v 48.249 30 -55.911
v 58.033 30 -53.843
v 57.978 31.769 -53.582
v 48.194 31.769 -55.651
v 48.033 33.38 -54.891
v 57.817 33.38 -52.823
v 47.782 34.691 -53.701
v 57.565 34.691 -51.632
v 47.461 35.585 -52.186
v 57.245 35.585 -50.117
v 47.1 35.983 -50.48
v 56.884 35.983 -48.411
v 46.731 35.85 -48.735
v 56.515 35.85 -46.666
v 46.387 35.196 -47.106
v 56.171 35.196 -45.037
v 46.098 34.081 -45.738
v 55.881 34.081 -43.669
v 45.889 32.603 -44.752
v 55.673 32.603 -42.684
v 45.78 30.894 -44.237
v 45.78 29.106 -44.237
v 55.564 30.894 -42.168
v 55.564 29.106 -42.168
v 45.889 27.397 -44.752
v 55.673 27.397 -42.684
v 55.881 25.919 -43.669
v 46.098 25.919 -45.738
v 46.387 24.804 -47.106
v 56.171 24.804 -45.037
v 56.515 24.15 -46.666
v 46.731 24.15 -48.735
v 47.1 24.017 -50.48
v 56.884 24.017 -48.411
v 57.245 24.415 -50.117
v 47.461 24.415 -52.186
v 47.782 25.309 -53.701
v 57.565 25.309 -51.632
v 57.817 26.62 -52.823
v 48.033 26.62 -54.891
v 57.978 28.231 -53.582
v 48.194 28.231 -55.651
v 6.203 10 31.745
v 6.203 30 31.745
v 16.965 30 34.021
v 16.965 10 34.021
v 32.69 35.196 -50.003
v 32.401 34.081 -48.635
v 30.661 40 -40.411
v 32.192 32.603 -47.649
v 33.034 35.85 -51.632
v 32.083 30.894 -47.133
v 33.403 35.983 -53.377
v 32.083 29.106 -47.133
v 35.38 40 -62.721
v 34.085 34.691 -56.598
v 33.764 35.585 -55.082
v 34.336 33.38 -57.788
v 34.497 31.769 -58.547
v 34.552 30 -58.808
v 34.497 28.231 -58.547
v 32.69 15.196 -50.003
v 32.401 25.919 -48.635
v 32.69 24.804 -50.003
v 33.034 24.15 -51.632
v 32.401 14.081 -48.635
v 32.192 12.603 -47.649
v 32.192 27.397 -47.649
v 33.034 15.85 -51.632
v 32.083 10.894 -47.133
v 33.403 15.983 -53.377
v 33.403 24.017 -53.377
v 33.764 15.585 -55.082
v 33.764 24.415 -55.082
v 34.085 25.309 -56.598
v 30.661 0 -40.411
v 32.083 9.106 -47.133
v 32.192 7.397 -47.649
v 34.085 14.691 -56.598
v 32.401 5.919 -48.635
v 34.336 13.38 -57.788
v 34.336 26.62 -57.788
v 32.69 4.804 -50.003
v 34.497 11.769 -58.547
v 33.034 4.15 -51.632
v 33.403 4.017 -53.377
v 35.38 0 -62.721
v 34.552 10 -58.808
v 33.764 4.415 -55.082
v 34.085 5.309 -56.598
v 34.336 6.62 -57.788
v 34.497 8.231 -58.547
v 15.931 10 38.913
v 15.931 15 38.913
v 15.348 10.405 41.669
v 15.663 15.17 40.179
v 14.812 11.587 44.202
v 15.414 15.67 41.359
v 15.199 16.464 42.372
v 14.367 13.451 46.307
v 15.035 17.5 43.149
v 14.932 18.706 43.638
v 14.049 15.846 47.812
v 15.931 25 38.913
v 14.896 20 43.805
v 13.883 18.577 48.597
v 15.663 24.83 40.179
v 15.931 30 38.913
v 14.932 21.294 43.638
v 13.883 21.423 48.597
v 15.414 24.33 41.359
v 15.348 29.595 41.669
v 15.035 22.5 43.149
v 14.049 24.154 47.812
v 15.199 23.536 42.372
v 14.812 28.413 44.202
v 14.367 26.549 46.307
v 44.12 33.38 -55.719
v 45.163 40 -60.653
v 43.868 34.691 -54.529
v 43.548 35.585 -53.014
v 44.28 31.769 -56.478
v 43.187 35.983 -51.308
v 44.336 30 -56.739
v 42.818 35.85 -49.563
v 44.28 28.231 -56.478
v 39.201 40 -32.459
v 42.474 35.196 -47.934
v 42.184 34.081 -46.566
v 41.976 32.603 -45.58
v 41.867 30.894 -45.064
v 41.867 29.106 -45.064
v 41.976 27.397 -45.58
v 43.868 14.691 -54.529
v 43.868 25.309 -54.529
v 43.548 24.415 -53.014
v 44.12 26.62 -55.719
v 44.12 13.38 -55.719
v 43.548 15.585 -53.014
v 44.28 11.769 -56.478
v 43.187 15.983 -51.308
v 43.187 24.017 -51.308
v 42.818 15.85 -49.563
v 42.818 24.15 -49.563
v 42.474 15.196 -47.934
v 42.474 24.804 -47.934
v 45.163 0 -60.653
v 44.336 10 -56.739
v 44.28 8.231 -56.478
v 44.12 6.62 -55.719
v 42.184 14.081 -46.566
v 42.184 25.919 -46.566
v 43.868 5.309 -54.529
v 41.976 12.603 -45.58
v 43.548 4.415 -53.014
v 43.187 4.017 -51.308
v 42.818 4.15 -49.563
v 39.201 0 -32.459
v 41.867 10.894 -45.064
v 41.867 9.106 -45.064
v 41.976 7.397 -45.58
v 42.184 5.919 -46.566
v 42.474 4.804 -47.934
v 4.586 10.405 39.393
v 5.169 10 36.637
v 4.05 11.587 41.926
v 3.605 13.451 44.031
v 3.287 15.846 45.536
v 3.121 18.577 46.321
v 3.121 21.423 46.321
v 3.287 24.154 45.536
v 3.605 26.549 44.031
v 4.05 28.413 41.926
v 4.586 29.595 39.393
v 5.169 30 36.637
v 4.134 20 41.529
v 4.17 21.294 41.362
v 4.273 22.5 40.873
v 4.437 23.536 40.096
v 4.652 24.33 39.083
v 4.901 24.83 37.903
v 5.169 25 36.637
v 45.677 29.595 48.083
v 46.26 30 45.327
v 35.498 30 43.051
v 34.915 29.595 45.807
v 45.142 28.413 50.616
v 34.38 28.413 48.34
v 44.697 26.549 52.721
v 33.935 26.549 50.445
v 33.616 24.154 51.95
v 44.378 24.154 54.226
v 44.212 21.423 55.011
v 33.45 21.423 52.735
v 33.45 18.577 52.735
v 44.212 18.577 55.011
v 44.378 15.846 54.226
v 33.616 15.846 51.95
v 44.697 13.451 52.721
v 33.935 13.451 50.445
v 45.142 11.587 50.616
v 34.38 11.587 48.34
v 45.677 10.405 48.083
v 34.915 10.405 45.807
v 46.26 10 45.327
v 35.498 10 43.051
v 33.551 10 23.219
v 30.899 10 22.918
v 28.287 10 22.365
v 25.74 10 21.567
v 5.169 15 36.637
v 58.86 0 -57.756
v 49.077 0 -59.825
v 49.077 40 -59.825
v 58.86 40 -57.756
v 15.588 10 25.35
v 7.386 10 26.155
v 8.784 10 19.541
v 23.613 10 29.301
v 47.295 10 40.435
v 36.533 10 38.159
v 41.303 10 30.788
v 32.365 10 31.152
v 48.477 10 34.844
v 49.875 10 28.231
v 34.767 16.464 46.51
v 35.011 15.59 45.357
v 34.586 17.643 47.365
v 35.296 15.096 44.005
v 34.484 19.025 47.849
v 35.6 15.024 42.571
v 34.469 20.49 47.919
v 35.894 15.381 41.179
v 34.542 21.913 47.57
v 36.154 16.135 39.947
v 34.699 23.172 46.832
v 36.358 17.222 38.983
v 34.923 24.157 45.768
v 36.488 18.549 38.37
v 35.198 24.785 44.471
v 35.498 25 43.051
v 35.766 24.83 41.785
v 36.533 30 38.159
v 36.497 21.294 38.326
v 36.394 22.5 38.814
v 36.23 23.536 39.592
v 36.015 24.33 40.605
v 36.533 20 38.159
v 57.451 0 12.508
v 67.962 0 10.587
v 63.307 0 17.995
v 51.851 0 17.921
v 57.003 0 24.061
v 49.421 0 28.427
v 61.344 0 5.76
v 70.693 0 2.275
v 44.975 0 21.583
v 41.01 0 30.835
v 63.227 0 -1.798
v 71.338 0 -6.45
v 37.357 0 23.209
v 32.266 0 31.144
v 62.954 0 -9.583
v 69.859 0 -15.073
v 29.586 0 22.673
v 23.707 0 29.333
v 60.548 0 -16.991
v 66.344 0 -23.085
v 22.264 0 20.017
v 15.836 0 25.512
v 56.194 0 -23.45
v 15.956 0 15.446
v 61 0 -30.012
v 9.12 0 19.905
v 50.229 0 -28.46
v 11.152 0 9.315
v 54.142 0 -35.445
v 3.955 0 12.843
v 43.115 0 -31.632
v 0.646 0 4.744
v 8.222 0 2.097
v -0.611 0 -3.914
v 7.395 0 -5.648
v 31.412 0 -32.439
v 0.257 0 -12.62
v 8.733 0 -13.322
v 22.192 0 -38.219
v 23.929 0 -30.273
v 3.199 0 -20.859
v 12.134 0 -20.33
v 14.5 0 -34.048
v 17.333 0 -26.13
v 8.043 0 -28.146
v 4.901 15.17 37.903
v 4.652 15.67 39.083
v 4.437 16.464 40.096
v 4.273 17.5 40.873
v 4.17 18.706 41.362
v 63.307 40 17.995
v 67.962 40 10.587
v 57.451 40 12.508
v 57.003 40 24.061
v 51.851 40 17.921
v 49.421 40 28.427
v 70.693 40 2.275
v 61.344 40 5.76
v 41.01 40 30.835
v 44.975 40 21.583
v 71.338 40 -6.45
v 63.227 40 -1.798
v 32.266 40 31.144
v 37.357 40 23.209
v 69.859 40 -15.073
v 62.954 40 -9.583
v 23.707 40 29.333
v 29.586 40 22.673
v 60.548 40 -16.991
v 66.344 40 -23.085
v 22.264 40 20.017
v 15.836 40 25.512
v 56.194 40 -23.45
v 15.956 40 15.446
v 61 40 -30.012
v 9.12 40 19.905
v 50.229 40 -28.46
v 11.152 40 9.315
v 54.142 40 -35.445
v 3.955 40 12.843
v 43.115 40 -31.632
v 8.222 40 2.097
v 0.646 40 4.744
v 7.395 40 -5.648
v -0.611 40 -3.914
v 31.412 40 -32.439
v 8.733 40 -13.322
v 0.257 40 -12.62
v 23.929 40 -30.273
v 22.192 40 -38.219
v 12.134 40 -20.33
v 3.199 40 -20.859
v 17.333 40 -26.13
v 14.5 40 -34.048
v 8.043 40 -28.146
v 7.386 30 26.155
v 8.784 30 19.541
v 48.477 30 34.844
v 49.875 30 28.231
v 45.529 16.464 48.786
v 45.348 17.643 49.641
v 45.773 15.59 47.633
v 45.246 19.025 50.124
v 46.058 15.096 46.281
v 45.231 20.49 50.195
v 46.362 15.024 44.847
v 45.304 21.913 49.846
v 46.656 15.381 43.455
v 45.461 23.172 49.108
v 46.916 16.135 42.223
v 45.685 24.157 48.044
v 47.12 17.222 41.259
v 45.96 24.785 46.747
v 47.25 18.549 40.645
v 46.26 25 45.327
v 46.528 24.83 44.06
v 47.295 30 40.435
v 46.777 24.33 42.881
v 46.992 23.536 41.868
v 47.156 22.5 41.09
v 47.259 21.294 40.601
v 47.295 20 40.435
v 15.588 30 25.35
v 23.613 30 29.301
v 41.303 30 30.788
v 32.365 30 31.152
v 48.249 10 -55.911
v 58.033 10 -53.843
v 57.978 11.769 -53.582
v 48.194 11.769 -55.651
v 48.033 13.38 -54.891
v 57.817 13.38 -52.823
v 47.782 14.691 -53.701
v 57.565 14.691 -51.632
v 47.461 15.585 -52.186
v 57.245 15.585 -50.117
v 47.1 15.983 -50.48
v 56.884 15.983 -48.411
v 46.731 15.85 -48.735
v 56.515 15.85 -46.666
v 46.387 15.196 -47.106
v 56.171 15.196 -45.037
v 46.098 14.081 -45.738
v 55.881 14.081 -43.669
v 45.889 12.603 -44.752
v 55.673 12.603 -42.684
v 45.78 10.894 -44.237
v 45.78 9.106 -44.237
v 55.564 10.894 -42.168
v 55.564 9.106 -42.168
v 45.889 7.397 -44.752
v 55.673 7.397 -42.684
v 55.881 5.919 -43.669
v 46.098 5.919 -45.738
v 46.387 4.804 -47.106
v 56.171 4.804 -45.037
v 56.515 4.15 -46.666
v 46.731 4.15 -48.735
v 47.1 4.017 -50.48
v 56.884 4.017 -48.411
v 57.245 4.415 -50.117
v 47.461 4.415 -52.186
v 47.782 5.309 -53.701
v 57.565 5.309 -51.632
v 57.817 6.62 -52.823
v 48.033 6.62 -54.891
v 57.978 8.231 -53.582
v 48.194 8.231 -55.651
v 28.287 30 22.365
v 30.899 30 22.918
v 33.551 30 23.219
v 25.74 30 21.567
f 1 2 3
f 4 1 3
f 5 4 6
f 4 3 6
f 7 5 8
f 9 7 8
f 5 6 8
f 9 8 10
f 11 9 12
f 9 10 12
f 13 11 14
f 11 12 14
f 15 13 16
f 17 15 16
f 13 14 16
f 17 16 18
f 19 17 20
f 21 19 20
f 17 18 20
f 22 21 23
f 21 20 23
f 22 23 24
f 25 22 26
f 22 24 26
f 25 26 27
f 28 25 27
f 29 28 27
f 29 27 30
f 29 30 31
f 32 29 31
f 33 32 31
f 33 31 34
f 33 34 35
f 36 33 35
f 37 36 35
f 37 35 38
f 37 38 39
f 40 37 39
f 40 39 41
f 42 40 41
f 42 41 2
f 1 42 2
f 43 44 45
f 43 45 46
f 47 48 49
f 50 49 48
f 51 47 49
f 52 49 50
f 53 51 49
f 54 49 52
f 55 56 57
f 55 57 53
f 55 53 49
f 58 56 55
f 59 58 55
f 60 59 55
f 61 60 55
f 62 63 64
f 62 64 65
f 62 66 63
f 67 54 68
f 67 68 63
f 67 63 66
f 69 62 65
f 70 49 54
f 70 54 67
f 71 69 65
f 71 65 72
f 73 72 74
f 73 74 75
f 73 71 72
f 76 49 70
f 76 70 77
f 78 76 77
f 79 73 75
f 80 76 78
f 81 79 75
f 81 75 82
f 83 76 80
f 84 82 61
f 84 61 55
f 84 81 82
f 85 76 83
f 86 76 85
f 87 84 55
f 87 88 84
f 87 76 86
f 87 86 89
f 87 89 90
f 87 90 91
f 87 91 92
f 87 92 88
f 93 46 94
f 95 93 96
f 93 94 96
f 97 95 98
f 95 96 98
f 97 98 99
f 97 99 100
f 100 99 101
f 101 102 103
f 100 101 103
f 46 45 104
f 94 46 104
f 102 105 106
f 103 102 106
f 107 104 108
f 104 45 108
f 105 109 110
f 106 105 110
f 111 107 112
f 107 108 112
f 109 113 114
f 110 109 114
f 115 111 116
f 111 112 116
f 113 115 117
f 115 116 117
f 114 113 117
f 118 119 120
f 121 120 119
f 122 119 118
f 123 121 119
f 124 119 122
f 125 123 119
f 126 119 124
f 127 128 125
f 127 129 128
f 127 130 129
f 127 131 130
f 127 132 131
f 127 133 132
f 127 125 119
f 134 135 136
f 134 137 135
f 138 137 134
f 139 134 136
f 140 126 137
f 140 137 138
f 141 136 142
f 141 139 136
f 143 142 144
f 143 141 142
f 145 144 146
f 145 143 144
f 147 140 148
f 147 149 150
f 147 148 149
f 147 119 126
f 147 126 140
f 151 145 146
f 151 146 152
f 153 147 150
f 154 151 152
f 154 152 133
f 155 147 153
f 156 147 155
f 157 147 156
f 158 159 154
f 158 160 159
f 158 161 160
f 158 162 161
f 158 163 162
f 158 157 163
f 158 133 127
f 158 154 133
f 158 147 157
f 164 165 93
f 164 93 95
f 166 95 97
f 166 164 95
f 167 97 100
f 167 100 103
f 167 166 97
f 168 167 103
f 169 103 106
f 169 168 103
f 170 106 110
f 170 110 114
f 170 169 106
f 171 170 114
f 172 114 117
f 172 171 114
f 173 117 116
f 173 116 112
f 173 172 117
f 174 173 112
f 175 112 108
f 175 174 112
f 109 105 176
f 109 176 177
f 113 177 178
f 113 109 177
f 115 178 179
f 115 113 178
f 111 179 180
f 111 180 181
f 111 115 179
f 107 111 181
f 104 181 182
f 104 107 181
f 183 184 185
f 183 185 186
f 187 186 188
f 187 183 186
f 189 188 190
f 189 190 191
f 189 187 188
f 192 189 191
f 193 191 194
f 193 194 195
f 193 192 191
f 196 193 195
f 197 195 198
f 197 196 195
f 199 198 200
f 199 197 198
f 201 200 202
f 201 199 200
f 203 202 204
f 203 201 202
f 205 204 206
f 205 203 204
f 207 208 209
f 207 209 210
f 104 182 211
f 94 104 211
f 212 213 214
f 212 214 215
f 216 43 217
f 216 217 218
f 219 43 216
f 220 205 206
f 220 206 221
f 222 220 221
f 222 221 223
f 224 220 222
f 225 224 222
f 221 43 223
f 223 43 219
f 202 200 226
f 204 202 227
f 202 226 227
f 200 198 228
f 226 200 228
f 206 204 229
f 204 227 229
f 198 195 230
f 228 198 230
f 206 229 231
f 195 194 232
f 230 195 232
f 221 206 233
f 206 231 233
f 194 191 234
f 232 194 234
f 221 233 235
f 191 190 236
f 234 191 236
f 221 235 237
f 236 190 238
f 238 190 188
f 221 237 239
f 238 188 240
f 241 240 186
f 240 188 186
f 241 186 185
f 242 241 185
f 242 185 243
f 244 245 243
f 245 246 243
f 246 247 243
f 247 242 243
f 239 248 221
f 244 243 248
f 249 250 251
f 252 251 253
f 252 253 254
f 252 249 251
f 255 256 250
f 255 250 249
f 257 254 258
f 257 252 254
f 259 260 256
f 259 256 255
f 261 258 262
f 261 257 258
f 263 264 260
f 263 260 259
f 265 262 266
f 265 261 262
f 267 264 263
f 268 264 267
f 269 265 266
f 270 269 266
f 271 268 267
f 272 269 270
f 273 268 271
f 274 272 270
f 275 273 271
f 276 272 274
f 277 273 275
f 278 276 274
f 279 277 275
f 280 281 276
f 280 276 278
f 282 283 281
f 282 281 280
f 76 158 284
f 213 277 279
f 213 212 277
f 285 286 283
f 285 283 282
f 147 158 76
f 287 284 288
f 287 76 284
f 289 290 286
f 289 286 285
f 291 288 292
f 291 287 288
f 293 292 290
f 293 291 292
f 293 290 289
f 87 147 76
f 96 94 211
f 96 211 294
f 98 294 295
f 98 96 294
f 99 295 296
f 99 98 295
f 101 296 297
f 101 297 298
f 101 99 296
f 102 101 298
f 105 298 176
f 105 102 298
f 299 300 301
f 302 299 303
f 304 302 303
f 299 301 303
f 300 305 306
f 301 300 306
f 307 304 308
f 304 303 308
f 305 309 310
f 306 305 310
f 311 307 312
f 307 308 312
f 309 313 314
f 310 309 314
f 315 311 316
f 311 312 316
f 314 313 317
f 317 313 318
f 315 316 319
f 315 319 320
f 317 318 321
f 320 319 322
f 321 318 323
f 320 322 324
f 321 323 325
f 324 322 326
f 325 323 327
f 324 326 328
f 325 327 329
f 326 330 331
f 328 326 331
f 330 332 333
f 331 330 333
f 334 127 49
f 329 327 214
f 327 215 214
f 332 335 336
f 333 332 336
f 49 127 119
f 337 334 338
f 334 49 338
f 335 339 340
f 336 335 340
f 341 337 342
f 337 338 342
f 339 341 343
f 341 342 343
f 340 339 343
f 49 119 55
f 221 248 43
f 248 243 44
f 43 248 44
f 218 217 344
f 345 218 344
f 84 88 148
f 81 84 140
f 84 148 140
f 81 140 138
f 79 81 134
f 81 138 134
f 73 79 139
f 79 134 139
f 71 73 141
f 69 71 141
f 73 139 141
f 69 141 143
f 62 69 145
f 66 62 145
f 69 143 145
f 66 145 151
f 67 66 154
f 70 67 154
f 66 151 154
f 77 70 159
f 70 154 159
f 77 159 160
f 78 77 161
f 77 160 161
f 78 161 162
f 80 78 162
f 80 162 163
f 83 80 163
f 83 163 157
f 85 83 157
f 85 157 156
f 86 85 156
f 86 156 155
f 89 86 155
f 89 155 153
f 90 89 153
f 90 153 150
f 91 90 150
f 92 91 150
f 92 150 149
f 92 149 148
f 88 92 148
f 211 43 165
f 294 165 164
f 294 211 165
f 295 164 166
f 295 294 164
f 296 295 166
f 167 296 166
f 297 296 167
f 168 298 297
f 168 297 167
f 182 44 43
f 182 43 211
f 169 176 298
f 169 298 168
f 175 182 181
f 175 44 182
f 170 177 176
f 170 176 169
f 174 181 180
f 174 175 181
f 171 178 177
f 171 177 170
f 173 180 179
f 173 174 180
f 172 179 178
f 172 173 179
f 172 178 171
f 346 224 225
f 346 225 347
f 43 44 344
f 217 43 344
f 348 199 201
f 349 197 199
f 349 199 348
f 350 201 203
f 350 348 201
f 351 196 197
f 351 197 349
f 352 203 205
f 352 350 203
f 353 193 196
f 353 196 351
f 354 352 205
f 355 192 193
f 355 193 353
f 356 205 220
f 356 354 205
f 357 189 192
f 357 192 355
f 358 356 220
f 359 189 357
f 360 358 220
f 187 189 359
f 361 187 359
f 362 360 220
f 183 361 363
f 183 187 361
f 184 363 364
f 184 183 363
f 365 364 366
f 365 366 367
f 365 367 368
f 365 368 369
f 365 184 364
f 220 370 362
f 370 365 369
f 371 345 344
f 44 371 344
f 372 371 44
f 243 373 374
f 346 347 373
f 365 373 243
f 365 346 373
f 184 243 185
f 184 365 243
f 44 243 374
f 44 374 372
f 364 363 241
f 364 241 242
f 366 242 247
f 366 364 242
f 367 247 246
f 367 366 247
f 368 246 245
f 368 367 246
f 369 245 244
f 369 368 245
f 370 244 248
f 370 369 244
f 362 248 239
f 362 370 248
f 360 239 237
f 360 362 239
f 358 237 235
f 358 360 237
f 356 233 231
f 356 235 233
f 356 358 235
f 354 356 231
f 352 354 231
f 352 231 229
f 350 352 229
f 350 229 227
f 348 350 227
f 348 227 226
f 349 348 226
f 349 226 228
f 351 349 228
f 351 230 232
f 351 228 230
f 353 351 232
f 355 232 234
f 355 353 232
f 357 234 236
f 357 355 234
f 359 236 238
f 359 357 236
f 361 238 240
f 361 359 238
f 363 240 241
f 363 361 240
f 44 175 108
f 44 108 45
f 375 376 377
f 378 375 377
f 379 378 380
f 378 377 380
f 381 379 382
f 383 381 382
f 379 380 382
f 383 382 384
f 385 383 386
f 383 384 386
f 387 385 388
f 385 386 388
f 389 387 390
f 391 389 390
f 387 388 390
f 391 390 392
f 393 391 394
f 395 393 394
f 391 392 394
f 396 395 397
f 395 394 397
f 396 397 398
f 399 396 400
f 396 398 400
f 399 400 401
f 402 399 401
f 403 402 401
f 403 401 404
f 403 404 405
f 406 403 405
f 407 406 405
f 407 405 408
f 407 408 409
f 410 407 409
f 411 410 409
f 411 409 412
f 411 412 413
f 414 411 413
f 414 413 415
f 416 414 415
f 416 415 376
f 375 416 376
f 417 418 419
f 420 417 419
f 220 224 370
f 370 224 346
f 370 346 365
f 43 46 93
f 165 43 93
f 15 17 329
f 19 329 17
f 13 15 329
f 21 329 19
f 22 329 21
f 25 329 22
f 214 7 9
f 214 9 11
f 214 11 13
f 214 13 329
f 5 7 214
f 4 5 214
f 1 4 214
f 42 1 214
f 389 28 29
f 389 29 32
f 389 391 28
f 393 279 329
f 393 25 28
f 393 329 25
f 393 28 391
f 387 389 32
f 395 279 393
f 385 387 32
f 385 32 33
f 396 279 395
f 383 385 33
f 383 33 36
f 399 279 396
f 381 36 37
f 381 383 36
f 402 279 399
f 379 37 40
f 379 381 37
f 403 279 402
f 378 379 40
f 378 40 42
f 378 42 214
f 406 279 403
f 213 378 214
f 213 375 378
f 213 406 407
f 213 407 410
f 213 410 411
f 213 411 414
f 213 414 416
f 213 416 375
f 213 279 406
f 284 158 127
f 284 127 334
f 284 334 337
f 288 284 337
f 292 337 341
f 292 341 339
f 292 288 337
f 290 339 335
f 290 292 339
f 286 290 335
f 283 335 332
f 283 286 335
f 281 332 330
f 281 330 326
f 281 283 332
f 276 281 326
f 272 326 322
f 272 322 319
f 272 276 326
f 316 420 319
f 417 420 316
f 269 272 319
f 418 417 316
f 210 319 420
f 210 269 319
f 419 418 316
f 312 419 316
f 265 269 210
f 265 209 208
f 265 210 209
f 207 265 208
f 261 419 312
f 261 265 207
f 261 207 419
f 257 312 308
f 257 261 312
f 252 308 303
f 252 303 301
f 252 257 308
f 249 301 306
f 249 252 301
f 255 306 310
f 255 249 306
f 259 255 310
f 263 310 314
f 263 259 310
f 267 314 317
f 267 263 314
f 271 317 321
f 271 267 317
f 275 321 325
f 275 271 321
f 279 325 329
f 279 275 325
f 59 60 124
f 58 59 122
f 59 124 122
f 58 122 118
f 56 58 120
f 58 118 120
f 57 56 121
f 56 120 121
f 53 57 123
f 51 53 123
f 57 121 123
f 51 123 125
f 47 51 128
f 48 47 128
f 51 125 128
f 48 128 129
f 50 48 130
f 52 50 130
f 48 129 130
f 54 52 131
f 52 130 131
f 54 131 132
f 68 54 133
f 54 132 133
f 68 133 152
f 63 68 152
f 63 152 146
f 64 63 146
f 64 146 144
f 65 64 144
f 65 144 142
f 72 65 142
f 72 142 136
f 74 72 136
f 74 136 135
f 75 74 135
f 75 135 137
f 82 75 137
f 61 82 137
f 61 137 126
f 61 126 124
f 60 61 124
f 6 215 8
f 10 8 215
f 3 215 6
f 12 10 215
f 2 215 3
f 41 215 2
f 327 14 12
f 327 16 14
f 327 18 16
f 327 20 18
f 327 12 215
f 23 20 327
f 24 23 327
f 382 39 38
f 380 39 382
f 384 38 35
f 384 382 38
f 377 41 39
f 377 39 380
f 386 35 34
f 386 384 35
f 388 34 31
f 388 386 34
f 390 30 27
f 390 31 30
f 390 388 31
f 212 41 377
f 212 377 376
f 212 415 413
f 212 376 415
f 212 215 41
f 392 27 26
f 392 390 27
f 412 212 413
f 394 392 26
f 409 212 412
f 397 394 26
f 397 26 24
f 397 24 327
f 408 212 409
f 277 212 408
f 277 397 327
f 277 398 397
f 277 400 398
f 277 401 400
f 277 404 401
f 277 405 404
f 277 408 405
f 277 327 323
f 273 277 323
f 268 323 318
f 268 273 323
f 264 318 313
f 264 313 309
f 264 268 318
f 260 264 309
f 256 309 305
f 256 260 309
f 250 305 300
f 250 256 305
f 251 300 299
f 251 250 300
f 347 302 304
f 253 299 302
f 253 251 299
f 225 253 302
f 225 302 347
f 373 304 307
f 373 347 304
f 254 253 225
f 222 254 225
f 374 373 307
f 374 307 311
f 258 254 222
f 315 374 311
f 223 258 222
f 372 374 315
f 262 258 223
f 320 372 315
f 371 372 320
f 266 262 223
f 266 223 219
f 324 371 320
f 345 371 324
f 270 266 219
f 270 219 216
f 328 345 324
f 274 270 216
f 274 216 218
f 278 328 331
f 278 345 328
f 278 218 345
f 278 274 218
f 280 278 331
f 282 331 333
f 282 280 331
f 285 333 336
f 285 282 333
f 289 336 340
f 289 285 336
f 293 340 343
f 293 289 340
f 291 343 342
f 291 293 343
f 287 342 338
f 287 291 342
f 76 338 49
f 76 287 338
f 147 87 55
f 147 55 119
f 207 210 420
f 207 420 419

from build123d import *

# Parameters (mm, degrees)
BOSS_EXTRUDE1_DEPTH = 40
SKETCH2_R           = 6
CUT_EXTRUDE1_DEPTH  = 40
BOSS_EXTRUDE2_DEPTH = 10
SKETCH5_W           = 42
SKETCH5_H           = 20
BOSS_EXTRUDE3_DEPTH = 19
CUT_EXTRUDE3_DEPTH  = 100.644488095
BOSS_EXTRUDE6_DEPTH = 11
CUT_EXTRUDE4_DEPTH  = 101.019808074
BOSS_EXTRUDE7_DEPTH = 11
CUT_EXTRUDE8_START  = -11
CUT_EXTRUDE8_DEPTH  = 11


with BuildPart() as part:
    # Sketch1 → Boss-Extrude1 (new body)
    with BuildSketch(Plane(origin=(0, 0, 0), x_dir=(1, 0, 0), z_dir=(0, 1, 0))):
        with BuildLine():
            Line((30.661481596, 40.410991), (35.379533666, 62.721496963))
            Line((35.379533666, 62.721496963), (45.163161914, 60.652531445))
            Line((45.163161914, 60.652531445), (39.201114242, 32.459476736))
            ThreePointArc((39.201114242, 32.459476736), (29.586430218, -22.672662131), (43.114565541, 31.631890529))
            Line((43.114565541, 31.631890529), (49.076613213, 59.824945239))
            Line((49.076613213, 59.824945239), (58.860241461, 57.755979721))
            Line((58.860241461, 57.755979721), (54.14218939, 35.445473759))
            ThreePointArc((54.14218939, 35.445473759), (27.931257804, -30.499564729), (30.661481596, 40.410991))
        make_face()
    extrude(amount=BOSS_EXTRUDE1_DEPTH)

    # Sketch2 → Cut-Extrude1 (cut)
    with BuildSketch(Plane(origin=(44.649699848, 0, 9.442170839), x_dir=(0.20689655172413562, 0, -0.9783628247662838), z_dir=(0.9783628247662838, 0, 0.20689655172413562))):
        with Locations((58.684284459, 30)):
            Circle(SKETCH2_R)
        with Locations((58.684284459, 10)):
            Circle(SKETCH2_R)
    extrude(amount=-CUT_EXTRUDE1_DEPTH, mode=Mode.SUBTRACT)



with BuildPart() as body_2:
    # Sketch3 → Boss-Extrude2 (new, symmetric)
    with BuildSketch(Plane(origin=(0, 20, 0), x_dir=(1, 0, 0), z_dir=(0, 1, 0))):
        Polygon((16.190903907, -28.016806108), (7.385638484, -26.154737143), (5.168950645, -36.636907859), (46.260189285, -45.326563031), (48.476877124, -34.844392315), (39.671611701, -32.98232335), align=None)
    extrude(amount=BOSS_EXTRUDE2_DEPTH, both=True)


with BuildPart() as part_1:
    add(part.part)

    add(body_2.part)  # Boss-Extrude3 merges body 2
    # Sketch5 → Boss-Extrude3 (add)
    with BuildSketch(Plane(origin=(-7.194775986, 0, 34.022323226), x_dir=(0.9783628247662839, 0, 0.2068965517241352), z_dir=(-0.2068965517241352, 0, 0.9783628247662839))):
        with Locations((33.637159056, 20)):
            Rectangle(SKETCH5_W, SKETCH5_H)
    extrude(amount=-BOSS_EXTRUDE3_DEPTH)

    # Sketch7 → Cut-Extrude3 (cut, through all)
    with BuildSketch(Plane(origin=(0, 30, 0), x_dir=(1, 0, 0), z_dir=(0, 1, 0))):
        Polygon((47.294672044, -40.434748907), (6.203433404, -31.745093735), (5.168950645, -36.636907859), (46.260189285, -45.326563031), align=None)
    extrude(amount=-CUT_EXTRUDE3_DEPTH, mode=Mode.SUBTRACT)

    # Sketch9 → Boss-Extrude6 (add)
    with BuildSketch(Plane(origin=(53.454965271, 0, 11.304239805), x_dir=(0.20689655172413524, 0, -0.9783628247662839), z_dir=(0.9783628247662839, 0, 0.20689655172413524))):
        with BuildLine():
            Line((-29.774750599, 30), (-34.774750599, 30))
            ThreePointArc((-34.774750599, 30), (-44.774750599, 20), (-34.774750599, 10))
            Line((-34.774750599, 10), (-29.774750599, 10))
            Line((-29.774750599, 10), (-29.774750599, 30))
        make_face()
        with BuildLine():
            Line((-34.774750599, 25), (-34.774750599, 15))
            ThreePointArc((-34.774750599, 15), (-39.774750599, 20), (-34.774750599, 25))
        make_face(mode=Mode.SUBTRACT)
    extrude(amount=-BOSS_EXTRUDE6_DEPTH)

    # Sketch10 → Cut-Extrude4 (cut, through all)
    with BuildSketch(Plane(origin=(53.454965271, 0, 11.304239805), x_dir=(0.20689655172413524, 0, -0.9783628247662839), z_dir=(0.9783628247662839, 0, 0.20689655172413524))):
        with BuildLine():
            Line((-34.774750599, 15), (-34.774750599, 25))
            ThreePointArc((-34.774750599, 25), (-29.774750599, 20), (-34.774750599, 15))
        make_face()
    extrude(amount=-CUT_EXTRUDE4_DEPTH, mode=Mode.SUBTRACT)


with BuildPart() as body_2_2:
    # Sketch11 → Boss-Extrude7 (new body)
    with BuildSketch(Plane(origin=(12.363726631, 0, 2.614584632), x_dir=(-0.20689655172413524, 0, 0.9783628247662839), z_dir=(-0.9783628247662839, 0, -0.20689655172413524))):
        with BuildLine():
            Line((34.774750599, 30), (29.774750599, 30))
            Line((29.774750599, 30), (29.774750599, 10))
            Line((29.774750599, 10), (34.774750599, 10))
            ThreePointArc((34.774750599, 10), (44.774750599, 20), (34.774750599, 30))
        make_face()
    extrude(amount=-BOSS_EXTRUDE7_DEPTH)

    # Sketch12 → Cut-Extrude8 (cut)
    with BuildSketch(Plane(origin=(12.363726631, 0, 2.614584632), x_dir=(-0.20689655172413526, 0, 0.9783628247662839), z_dir=(-0.9783628247662839, 0, -0.20689655172413526)).offset(CUT_EXTRUDE8_START)):
        with BuildLine():
            ThreePointArc((39.774750599, 20), (38.310284505, 23.535533906), (34.774750599, 25))
            Line((34.774750599, 25), (34.774750599, 15))
            ThreePointArc((34.774750599, 15), (38.310284505, 16.464466094), (39.774750599, 20))
        make_face()
    extrude(amount=CUT_EXTRUDE8_DEPTH, mode=Mode.SUBTRACT)


solid = Compound([part_1.part, body_2_2.part])
